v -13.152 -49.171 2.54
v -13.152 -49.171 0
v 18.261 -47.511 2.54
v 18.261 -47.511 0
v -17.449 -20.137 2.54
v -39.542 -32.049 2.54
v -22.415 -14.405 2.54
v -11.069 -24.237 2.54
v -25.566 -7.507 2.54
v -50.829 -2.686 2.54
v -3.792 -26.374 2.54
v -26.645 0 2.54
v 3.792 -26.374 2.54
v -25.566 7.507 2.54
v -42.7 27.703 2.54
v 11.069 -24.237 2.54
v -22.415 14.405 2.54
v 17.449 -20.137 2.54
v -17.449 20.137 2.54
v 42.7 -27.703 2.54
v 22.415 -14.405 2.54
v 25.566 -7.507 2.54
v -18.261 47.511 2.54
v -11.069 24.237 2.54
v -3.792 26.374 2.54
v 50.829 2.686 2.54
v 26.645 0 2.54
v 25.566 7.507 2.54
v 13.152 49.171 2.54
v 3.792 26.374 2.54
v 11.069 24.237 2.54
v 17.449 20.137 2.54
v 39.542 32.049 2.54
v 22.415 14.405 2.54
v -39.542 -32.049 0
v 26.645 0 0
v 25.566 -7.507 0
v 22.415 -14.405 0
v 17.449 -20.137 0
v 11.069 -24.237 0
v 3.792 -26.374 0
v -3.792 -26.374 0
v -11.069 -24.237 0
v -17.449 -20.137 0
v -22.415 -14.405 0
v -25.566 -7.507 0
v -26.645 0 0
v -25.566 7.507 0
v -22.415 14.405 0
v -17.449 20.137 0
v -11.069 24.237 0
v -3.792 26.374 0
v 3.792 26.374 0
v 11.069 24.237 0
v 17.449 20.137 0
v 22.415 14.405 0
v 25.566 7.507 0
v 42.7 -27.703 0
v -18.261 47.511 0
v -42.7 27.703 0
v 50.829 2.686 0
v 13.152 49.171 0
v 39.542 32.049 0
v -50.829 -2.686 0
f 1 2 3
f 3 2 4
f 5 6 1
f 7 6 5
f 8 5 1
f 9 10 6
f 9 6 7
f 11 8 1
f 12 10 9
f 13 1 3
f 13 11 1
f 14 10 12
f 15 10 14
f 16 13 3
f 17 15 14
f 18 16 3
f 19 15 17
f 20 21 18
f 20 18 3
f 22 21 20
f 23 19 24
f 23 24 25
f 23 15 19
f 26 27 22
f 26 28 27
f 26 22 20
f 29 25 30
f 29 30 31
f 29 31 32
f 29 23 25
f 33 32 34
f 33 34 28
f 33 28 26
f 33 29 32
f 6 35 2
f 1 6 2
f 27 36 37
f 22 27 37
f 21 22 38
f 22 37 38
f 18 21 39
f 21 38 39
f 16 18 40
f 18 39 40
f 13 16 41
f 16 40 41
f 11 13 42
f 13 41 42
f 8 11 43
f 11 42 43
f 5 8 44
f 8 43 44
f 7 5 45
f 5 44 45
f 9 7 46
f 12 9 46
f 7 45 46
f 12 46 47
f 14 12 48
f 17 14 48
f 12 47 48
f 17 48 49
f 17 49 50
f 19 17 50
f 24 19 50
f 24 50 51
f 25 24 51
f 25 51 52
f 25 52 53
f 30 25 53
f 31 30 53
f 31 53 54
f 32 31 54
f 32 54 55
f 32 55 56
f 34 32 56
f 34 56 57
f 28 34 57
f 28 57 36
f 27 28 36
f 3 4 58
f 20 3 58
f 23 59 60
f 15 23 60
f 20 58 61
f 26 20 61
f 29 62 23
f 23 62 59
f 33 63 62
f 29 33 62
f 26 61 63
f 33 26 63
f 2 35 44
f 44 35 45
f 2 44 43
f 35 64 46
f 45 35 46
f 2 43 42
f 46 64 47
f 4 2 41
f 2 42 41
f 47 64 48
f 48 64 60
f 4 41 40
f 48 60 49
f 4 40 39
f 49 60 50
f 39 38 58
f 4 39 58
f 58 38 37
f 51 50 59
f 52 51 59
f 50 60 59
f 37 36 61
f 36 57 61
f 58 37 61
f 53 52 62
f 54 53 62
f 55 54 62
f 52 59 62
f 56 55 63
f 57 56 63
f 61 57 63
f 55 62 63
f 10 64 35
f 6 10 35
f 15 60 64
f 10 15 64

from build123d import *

# Parameters (mm, degrees)
F3_DEPTH = 2.54
F4_R     = 26.6451921389
F5_DEPTH = 25.4


# Not quite as in the source:
# - the program builds the solid bodies; features that only make, move or delete a surface that nothing else refers to are left out


with BuildPart() as f3:
    # F0 (on Top) → F3 (new body)
    with BuildSketch(Plane.XY):
        Polygon((13.1522906624, 49.1708465148), (-18.2614717633, 47.5107729435), (-42.69997266, 27.7031989396), (-50.8285353193, -2.6860554622), (-39.542325085, -32.049327973), (-13.1522906624, -49.1708465148), (18.2614717633, -47.5107729435), (42.69997266, -27.7031989396), (50.8285353193, 2.6860554622), (39.542325085, 32.049327973), align=None)
    extrude(amount=F3_DEPTH)

    # F4 (on face) → F5 (cut)
    with BuildSketch(Plane(origin=(0, 0, 0), x_dir=(1, 0, 0), z_dir=(0, 0, -1))):
        Circle(F4_R)
    extrude(amount=-F5_DEPTH, mode=Mode.SUBTRACT)


solid = f3.part
